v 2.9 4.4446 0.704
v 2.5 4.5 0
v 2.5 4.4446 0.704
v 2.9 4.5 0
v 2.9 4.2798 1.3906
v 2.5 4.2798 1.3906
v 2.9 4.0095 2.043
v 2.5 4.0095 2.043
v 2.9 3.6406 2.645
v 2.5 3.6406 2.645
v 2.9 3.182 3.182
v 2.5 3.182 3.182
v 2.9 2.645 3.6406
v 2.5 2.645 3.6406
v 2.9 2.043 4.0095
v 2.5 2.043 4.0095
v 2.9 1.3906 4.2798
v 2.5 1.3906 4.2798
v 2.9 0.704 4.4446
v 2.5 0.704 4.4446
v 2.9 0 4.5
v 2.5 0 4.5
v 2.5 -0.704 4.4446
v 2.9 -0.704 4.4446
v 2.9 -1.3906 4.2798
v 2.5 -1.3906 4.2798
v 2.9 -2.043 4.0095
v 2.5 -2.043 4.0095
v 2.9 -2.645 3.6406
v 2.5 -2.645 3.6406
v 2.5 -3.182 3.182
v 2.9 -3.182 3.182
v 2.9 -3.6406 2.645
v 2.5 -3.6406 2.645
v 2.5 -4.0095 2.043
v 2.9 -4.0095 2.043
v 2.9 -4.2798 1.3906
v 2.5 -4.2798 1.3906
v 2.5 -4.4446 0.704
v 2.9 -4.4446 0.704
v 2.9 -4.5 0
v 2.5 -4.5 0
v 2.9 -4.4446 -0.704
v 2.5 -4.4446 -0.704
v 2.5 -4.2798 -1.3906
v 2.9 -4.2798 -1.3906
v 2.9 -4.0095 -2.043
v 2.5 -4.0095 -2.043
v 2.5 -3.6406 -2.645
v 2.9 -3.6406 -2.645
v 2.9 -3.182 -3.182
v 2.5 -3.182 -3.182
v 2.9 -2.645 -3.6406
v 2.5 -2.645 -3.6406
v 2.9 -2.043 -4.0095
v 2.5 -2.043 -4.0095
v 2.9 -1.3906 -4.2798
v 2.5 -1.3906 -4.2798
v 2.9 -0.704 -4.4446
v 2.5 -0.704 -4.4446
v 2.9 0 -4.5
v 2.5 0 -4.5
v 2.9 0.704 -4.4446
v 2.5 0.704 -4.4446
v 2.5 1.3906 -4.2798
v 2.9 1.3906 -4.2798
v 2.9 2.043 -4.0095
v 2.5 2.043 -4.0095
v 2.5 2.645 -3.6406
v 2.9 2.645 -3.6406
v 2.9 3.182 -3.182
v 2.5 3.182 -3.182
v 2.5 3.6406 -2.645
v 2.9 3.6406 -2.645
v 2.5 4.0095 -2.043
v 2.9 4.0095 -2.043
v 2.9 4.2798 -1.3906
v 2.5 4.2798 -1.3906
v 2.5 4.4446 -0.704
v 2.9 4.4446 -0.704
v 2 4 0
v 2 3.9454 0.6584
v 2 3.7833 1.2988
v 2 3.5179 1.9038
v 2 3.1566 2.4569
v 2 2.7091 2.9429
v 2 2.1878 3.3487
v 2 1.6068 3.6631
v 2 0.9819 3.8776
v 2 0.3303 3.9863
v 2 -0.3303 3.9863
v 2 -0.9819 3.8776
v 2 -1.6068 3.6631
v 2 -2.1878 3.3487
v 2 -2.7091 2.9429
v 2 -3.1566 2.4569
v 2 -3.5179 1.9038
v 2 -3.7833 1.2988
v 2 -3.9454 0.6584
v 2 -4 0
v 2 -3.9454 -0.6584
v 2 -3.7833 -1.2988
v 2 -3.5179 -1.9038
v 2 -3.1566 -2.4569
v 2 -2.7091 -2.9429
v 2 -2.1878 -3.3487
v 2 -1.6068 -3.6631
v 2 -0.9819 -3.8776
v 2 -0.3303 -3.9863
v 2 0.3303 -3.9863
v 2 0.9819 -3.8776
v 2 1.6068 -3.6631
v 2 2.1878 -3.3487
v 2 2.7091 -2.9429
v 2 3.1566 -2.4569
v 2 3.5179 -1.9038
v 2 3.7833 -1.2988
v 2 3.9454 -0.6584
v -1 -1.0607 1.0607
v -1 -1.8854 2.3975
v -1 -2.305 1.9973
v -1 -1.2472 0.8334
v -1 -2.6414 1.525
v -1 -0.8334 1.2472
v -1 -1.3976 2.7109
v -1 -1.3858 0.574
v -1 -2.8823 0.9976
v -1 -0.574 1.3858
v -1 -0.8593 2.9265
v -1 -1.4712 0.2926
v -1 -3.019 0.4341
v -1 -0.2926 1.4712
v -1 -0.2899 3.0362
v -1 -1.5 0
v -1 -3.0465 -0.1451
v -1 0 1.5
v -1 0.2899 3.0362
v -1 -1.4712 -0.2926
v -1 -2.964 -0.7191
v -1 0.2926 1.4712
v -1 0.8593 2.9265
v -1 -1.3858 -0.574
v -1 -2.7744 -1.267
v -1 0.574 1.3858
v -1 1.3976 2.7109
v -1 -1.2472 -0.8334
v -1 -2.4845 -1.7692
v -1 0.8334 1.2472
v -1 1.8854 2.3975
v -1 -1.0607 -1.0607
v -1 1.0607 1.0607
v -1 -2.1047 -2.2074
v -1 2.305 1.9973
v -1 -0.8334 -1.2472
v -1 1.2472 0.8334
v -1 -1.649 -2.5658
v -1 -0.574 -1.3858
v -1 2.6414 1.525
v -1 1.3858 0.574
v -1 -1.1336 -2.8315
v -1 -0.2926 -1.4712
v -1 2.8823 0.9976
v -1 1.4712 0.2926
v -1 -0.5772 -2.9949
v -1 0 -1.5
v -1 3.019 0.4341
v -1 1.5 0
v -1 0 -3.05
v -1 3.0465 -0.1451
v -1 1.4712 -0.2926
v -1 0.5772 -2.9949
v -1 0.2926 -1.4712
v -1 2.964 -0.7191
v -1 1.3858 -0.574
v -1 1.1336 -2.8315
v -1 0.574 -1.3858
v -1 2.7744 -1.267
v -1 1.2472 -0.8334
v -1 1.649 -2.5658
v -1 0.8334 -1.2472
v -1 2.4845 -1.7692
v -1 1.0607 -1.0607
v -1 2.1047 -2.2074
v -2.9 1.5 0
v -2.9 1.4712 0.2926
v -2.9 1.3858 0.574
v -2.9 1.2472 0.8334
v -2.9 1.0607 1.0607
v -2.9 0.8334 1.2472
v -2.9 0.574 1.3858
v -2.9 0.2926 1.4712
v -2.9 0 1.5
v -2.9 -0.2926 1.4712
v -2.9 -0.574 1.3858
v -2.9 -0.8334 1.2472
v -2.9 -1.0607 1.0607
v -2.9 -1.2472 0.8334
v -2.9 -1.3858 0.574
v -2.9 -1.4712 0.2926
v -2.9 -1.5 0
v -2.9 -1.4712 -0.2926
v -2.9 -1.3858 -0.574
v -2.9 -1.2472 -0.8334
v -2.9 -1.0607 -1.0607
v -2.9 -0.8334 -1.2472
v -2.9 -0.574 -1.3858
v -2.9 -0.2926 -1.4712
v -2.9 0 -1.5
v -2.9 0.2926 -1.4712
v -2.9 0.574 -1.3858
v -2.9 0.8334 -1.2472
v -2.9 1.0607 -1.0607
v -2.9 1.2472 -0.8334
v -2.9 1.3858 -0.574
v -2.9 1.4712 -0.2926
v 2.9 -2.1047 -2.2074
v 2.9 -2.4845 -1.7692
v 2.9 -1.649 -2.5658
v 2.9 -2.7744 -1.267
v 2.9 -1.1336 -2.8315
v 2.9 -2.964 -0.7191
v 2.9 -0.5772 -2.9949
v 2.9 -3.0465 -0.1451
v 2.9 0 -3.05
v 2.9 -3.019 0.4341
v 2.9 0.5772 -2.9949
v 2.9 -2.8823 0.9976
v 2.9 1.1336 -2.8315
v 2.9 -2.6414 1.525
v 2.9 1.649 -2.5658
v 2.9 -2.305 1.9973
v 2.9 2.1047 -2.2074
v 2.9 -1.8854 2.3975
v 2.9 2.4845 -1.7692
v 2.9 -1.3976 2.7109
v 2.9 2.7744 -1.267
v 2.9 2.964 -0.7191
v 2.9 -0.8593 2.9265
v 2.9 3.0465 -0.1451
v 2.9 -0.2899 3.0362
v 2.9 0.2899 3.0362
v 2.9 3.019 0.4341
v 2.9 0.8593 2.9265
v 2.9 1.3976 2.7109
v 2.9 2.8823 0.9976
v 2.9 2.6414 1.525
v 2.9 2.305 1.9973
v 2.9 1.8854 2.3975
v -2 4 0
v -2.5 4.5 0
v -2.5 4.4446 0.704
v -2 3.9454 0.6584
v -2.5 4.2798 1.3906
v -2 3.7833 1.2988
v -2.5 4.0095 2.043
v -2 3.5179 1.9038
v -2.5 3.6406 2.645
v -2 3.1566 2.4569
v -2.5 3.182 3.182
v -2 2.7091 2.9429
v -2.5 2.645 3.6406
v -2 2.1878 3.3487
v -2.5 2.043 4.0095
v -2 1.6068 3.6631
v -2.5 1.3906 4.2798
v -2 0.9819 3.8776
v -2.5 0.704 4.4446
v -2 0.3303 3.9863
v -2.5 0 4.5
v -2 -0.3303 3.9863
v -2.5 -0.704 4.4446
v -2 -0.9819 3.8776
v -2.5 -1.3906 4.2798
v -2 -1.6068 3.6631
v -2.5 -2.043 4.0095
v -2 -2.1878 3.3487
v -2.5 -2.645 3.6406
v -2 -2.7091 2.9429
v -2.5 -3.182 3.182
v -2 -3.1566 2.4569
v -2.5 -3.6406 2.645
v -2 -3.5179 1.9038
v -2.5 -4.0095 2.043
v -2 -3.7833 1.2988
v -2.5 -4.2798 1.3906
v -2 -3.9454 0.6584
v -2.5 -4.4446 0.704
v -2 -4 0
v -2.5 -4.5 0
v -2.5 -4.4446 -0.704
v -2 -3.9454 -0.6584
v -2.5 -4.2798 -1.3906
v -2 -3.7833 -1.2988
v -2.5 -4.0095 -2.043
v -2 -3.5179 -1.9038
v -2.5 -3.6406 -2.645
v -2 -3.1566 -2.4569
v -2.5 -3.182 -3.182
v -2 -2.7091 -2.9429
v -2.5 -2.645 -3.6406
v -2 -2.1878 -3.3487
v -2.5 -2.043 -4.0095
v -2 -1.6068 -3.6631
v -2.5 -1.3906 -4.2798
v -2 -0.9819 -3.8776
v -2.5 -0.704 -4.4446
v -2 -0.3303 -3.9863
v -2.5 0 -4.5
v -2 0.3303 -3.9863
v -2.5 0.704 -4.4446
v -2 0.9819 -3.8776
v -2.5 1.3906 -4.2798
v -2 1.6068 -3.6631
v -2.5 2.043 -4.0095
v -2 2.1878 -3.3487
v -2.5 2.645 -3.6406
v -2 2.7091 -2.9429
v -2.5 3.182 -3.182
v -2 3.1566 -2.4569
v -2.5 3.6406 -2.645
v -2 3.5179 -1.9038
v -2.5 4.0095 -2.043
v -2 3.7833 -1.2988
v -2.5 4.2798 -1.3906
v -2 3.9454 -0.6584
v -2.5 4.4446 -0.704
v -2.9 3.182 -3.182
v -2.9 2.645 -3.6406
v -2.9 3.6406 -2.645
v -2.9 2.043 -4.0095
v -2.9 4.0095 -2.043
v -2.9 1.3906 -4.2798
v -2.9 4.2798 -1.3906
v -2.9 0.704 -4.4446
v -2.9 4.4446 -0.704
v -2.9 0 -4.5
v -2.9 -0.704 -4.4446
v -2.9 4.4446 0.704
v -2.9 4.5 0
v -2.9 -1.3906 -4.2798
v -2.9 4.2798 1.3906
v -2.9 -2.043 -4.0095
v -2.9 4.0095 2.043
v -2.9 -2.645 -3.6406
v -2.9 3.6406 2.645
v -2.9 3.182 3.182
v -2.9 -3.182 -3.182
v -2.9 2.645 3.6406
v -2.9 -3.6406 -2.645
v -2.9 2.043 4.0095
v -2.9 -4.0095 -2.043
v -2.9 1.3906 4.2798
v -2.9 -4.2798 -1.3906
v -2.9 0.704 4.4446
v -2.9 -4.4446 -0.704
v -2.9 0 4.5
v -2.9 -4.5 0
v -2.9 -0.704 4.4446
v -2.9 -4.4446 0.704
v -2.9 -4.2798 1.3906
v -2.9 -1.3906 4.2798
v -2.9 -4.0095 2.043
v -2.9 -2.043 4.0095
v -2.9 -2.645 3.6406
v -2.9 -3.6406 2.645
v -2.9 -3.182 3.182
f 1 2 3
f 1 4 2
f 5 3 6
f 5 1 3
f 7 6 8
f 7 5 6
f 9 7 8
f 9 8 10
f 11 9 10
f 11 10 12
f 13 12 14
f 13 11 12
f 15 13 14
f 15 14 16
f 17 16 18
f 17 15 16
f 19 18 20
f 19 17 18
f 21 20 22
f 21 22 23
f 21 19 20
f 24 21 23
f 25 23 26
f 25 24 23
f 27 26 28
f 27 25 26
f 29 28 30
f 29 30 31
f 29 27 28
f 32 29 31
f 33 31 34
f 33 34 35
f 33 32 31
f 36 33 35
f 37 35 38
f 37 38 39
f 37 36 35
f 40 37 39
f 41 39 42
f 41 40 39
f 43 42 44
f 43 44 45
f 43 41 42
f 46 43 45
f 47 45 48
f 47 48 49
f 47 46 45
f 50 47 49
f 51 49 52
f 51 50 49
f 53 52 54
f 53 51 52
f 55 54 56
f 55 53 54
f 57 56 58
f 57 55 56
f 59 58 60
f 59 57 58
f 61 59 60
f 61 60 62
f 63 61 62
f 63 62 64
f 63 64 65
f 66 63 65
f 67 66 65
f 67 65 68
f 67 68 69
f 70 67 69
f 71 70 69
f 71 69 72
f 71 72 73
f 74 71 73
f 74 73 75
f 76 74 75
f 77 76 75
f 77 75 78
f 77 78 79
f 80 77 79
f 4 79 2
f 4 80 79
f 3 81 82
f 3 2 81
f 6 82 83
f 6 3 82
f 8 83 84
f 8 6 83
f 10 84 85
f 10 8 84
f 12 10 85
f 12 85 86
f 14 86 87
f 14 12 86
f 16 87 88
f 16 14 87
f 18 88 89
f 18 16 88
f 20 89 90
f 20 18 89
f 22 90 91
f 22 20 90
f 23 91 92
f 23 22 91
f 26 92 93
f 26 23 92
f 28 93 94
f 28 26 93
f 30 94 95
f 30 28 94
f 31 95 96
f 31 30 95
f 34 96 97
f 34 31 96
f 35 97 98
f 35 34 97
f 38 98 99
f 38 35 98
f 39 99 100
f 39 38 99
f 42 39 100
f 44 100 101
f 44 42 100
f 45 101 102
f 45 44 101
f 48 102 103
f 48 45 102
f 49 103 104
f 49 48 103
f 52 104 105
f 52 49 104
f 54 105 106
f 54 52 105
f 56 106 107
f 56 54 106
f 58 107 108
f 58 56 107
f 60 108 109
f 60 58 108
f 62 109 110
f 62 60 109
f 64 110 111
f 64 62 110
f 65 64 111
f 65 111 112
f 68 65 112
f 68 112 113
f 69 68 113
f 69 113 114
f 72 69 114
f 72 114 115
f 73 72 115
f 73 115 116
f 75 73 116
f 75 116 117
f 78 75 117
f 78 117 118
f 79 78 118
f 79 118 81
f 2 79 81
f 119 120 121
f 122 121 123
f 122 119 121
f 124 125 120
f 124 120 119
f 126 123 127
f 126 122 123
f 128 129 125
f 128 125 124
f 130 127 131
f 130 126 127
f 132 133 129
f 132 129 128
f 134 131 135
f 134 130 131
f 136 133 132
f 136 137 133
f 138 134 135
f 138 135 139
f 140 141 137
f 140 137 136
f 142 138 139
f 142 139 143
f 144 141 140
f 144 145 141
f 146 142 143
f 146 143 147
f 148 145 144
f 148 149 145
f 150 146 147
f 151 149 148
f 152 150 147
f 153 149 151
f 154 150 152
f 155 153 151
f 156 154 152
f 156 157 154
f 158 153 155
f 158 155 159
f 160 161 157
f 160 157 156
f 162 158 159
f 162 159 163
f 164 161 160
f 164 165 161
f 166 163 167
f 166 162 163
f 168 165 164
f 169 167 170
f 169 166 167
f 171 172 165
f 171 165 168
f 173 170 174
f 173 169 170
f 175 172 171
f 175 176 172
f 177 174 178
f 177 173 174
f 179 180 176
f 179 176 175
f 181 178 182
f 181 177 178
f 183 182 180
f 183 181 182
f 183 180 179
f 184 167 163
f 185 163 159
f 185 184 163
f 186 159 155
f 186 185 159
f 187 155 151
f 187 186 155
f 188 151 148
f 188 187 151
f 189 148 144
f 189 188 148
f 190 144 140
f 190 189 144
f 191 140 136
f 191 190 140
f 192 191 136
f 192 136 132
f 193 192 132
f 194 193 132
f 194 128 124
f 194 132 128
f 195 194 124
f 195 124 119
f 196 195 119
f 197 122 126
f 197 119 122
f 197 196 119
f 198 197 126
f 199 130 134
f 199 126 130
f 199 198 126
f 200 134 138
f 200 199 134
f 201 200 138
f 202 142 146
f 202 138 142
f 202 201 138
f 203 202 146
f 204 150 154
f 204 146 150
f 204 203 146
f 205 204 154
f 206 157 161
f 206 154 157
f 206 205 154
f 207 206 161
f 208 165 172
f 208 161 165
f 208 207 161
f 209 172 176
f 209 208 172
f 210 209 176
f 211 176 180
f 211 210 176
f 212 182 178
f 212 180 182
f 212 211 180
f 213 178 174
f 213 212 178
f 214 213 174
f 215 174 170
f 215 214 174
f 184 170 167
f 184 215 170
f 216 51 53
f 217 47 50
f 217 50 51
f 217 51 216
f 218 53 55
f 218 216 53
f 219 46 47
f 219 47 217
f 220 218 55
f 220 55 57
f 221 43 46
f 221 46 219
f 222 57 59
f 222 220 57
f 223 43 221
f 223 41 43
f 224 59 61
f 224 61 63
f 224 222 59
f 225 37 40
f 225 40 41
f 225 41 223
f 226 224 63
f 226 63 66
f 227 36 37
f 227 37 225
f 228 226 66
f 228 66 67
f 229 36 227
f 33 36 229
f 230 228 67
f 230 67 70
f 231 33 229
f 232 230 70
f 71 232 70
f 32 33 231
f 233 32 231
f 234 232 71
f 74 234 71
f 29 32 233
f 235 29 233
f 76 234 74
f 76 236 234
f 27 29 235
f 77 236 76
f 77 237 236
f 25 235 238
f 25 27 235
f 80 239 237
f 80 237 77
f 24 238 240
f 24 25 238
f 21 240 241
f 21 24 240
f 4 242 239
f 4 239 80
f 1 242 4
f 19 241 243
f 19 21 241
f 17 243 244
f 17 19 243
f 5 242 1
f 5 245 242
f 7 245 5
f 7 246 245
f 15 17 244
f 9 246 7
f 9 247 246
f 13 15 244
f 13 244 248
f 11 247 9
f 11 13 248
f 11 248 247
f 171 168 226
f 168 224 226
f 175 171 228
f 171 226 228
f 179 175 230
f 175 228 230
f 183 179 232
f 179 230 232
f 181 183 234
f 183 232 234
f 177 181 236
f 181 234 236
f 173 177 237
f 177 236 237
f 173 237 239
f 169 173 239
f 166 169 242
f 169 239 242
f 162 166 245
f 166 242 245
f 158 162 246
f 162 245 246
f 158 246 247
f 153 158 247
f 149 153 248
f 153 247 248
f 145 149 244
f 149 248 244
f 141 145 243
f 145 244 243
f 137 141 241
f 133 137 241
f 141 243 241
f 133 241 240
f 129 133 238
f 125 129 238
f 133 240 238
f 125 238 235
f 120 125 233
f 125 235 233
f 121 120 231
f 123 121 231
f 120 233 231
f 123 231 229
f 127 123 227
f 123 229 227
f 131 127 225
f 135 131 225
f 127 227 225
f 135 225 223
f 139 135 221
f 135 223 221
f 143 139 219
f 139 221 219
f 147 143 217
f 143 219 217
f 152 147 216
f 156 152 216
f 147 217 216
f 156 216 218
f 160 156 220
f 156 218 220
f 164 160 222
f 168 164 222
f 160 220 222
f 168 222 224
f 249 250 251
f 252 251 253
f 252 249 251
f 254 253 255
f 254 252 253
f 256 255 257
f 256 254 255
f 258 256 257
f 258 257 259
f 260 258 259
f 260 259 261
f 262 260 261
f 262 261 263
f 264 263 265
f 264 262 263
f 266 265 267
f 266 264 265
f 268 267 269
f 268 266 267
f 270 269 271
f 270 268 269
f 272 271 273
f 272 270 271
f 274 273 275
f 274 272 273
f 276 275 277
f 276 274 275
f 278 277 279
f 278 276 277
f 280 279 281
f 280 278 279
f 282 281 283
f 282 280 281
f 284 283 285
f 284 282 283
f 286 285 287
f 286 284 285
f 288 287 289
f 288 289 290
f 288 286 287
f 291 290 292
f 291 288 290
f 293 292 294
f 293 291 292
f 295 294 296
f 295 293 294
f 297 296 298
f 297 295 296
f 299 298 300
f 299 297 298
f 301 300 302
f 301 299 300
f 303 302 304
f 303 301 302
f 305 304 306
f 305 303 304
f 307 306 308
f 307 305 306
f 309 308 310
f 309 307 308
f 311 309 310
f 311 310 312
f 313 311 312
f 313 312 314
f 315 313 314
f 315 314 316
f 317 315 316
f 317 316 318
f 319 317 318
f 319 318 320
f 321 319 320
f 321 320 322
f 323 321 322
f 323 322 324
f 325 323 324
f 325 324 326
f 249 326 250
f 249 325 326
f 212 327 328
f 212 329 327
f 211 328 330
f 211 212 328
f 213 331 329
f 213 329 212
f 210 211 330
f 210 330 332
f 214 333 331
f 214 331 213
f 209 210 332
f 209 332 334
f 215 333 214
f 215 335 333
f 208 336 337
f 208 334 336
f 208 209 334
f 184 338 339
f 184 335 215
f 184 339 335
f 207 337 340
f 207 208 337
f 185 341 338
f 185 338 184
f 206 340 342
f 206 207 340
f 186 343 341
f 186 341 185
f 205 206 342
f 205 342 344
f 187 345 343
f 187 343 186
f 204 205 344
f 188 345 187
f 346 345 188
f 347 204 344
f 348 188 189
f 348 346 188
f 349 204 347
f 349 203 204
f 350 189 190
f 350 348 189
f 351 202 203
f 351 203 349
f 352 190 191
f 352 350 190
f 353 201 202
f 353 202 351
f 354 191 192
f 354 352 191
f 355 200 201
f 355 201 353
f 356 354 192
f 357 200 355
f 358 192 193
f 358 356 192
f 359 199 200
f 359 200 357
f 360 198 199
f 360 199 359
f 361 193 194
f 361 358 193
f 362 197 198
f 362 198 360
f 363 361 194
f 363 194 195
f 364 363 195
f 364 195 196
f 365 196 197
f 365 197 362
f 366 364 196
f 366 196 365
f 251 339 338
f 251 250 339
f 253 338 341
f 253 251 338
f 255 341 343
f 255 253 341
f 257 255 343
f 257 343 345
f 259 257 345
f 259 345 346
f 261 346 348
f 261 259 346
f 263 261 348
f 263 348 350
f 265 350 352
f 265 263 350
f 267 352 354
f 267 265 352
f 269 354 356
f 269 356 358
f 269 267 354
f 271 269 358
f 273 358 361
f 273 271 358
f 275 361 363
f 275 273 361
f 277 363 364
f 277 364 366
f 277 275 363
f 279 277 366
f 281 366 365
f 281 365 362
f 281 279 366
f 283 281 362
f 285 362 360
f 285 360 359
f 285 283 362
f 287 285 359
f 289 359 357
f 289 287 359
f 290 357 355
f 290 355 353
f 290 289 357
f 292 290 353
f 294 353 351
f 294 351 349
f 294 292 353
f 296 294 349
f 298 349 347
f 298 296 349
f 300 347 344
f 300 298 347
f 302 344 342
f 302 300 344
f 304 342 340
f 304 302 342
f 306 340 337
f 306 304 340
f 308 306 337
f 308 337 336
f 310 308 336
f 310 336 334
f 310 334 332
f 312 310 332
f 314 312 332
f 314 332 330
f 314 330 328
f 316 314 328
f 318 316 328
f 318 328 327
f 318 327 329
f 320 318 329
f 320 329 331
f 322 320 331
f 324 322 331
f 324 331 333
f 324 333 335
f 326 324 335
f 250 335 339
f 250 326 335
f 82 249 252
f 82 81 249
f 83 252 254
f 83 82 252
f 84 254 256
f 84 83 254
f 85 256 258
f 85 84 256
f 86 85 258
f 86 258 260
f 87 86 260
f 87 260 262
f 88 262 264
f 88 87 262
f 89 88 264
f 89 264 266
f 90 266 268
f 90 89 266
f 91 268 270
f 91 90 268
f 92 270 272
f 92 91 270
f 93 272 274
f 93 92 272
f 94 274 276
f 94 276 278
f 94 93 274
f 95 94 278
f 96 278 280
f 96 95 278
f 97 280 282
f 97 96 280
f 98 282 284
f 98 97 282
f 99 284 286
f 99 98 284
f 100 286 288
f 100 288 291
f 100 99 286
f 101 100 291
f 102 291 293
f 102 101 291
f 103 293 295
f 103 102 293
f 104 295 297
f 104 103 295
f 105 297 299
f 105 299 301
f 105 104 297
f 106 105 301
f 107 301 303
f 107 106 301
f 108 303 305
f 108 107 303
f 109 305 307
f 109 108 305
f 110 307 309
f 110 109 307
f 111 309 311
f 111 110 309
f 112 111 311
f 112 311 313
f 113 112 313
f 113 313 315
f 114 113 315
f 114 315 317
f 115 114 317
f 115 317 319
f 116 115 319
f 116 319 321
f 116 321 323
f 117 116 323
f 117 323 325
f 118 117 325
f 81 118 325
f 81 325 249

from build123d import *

# Parameters (mm, degrees)
SKETCH3_R               = 3.05
CUT_EXTRUDE1_DEPTH      = 10
CUT_EXTRUDE1_DEPTH_BACK = 1


with BuildPart() as part:
    # Sketch1 → Revolve1 (revolve)
    with BuildSketch(Plane.XY):
        Polygon((-2.9, 1.5), (-2.9, 4.5), (-2.5, 4.5), (-2, 4), (2, 4), (2.5, 4.5), (2.9, 4.5), (2.9, 1.5), align=None)
    revolve(axis=Axis((0, 0, 0), (1, 0, 0)))

    # Sketch3 → Cut-Extrude1 (cut, two sides)
    with BuildSketch(Plane(origin=(0, 0, 0), x_dir=(0, 0, -1), z_dir=(1, 0, 0))) as cut_extrude1_sk:
        Circle(SKETCH3_R)
    extrude(amount=CUT_EXTRUDE1_DEPTH, mode=Mode.SUBTRACT)
    extrude(cut_extrude1_sk.sketch, amount=-CUT_EXTRUDE1_DEPTH_BACK, mode=Mode.SUBTRACT)


solid = part.part
